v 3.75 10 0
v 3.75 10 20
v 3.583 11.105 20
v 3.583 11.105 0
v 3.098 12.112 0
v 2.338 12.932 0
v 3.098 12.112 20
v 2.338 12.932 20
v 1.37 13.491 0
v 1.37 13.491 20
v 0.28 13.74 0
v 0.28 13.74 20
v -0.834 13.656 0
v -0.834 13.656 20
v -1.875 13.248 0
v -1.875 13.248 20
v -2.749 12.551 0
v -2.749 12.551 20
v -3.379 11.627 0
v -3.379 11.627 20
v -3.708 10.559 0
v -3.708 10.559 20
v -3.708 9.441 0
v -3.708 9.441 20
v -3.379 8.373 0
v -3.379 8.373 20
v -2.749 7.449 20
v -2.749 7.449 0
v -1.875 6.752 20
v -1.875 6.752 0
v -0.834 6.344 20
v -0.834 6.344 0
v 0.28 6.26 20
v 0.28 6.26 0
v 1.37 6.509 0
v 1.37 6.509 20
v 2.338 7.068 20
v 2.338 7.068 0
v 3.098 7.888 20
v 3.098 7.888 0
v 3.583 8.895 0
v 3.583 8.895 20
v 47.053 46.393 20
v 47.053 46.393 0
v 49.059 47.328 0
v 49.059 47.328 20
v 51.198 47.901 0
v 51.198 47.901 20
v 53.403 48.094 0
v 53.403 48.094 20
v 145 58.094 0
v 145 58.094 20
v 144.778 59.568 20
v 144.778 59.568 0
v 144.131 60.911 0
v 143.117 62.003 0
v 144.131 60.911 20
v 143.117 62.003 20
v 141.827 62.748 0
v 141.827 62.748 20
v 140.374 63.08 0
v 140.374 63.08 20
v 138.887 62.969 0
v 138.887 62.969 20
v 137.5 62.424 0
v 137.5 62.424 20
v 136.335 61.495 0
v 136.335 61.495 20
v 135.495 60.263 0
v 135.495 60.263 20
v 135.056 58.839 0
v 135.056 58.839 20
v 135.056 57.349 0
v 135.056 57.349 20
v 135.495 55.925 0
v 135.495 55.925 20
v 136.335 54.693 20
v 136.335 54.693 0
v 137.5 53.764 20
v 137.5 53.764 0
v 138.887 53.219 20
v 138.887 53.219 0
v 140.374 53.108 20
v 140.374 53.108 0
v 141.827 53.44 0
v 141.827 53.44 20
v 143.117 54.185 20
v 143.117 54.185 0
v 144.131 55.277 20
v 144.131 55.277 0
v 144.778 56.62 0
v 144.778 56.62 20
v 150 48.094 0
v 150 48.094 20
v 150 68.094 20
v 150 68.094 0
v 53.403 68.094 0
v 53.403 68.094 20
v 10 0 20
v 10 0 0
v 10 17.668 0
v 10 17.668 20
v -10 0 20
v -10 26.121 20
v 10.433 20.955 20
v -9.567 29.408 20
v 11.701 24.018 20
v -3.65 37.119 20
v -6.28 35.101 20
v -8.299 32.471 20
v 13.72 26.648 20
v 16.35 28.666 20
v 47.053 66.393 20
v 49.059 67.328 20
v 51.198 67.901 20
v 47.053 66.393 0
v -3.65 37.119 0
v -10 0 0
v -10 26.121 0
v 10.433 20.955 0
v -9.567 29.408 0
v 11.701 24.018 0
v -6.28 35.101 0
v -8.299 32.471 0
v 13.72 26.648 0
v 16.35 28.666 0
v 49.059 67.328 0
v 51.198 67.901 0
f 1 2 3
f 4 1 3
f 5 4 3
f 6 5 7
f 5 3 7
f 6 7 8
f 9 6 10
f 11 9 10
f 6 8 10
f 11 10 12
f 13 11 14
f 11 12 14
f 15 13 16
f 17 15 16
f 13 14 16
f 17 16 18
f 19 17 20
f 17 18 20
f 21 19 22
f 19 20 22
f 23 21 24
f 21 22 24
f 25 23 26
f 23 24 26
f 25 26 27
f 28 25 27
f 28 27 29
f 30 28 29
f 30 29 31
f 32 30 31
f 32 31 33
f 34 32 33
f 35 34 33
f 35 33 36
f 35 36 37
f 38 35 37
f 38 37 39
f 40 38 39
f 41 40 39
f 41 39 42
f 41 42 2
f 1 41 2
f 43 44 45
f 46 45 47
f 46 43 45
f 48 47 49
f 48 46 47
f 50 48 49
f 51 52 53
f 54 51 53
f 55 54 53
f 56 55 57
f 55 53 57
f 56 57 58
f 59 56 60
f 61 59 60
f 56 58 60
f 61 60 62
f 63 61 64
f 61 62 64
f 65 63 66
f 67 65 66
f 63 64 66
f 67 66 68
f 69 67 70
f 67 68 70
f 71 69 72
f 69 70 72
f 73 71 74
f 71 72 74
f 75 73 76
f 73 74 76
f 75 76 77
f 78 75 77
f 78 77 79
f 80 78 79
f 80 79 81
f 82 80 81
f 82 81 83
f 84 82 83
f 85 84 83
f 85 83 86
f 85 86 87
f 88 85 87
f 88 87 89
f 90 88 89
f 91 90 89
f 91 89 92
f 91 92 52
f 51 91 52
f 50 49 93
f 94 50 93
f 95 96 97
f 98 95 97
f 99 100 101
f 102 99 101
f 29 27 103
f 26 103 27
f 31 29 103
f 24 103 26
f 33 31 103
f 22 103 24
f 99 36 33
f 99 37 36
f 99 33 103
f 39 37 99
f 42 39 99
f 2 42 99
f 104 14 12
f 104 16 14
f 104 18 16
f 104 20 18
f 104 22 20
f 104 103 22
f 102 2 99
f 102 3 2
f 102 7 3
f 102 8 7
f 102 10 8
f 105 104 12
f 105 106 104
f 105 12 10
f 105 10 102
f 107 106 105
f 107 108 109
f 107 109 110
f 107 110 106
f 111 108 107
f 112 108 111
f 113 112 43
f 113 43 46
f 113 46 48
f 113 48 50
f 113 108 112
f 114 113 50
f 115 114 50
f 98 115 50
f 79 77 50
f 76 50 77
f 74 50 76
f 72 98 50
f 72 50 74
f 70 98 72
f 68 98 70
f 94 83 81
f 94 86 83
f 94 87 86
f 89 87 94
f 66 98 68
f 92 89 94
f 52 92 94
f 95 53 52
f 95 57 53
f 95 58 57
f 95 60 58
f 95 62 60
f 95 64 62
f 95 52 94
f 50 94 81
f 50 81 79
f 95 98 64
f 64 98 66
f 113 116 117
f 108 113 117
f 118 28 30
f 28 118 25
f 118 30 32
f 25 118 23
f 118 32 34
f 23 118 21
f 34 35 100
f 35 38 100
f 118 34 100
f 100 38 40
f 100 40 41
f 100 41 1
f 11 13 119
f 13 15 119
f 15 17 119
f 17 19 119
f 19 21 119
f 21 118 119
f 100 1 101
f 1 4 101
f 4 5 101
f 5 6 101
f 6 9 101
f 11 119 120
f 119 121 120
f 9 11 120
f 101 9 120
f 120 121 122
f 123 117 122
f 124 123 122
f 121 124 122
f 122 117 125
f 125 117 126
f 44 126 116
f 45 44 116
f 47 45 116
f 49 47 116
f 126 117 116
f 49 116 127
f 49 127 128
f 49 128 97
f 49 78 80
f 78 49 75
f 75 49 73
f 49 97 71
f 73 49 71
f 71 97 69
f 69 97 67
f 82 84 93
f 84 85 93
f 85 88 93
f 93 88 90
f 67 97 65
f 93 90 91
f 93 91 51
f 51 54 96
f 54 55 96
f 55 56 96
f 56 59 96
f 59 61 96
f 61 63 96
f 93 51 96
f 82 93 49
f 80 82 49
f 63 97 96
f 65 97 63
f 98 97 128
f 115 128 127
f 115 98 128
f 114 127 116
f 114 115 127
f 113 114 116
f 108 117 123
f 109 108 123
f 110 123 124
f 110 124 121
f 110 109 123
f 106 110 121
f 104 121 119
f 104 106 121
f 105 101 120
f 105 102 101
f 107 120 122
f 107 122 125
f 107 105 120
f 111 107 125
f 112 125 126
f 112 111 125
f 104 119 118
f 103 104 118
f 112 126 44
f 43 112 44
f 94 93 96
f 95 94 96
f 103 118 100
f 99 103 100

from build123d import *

# Parameters (mm, degrees)
BOSS_EXTRUDE1_DEPTH = 20
FILLET2_R           = 12.7
SKETCH2_R           = 5
SKETCH2_R_2         = 3.75
CUT_EXTRUDE1_DEPTH  = 166.94214143


with BuildPart() as part:
    # Sketch1 → Boss-Extrude1 (new body)
    with BuildSketch(Plane.XY):
        Polygon((10, 0), (10, 25), (50, 48.094010768), (150, 48.094010768), (150, 68.094010768), (50, 68.094010768), (-10, 33.452994616), (-10, 0), align=None)
    extrude(amount=BOSS_EXTRUDE1_DEPTH)

    # Fillet2
    fillet2_edges = [part.edges().sort_by_distance(p)[0] for p in [
        (-10, 33.452994616, 10),
        (50, 68.094010768, 10),
        (50, 48.094010768, 10),
        (10, 25, 10),
    ]]
    fillet(fillet2_edges, radius=FILLET2_R)

    # Sketch2 → Cut-Extrude1 (cut, through all)
    with BuildSketch(Plane.XY.offset(20)):
        with Locations((140, 58.094010768)):
            Circle(SKETCH2_R)
        with Locations((0, 10)):
            Circle(SKETCH2_R_2)
    extrude(amount=-CUT_EXTRUDE1_DEPTH, mode=Mode.SUBTRACT)


solid = part.part
